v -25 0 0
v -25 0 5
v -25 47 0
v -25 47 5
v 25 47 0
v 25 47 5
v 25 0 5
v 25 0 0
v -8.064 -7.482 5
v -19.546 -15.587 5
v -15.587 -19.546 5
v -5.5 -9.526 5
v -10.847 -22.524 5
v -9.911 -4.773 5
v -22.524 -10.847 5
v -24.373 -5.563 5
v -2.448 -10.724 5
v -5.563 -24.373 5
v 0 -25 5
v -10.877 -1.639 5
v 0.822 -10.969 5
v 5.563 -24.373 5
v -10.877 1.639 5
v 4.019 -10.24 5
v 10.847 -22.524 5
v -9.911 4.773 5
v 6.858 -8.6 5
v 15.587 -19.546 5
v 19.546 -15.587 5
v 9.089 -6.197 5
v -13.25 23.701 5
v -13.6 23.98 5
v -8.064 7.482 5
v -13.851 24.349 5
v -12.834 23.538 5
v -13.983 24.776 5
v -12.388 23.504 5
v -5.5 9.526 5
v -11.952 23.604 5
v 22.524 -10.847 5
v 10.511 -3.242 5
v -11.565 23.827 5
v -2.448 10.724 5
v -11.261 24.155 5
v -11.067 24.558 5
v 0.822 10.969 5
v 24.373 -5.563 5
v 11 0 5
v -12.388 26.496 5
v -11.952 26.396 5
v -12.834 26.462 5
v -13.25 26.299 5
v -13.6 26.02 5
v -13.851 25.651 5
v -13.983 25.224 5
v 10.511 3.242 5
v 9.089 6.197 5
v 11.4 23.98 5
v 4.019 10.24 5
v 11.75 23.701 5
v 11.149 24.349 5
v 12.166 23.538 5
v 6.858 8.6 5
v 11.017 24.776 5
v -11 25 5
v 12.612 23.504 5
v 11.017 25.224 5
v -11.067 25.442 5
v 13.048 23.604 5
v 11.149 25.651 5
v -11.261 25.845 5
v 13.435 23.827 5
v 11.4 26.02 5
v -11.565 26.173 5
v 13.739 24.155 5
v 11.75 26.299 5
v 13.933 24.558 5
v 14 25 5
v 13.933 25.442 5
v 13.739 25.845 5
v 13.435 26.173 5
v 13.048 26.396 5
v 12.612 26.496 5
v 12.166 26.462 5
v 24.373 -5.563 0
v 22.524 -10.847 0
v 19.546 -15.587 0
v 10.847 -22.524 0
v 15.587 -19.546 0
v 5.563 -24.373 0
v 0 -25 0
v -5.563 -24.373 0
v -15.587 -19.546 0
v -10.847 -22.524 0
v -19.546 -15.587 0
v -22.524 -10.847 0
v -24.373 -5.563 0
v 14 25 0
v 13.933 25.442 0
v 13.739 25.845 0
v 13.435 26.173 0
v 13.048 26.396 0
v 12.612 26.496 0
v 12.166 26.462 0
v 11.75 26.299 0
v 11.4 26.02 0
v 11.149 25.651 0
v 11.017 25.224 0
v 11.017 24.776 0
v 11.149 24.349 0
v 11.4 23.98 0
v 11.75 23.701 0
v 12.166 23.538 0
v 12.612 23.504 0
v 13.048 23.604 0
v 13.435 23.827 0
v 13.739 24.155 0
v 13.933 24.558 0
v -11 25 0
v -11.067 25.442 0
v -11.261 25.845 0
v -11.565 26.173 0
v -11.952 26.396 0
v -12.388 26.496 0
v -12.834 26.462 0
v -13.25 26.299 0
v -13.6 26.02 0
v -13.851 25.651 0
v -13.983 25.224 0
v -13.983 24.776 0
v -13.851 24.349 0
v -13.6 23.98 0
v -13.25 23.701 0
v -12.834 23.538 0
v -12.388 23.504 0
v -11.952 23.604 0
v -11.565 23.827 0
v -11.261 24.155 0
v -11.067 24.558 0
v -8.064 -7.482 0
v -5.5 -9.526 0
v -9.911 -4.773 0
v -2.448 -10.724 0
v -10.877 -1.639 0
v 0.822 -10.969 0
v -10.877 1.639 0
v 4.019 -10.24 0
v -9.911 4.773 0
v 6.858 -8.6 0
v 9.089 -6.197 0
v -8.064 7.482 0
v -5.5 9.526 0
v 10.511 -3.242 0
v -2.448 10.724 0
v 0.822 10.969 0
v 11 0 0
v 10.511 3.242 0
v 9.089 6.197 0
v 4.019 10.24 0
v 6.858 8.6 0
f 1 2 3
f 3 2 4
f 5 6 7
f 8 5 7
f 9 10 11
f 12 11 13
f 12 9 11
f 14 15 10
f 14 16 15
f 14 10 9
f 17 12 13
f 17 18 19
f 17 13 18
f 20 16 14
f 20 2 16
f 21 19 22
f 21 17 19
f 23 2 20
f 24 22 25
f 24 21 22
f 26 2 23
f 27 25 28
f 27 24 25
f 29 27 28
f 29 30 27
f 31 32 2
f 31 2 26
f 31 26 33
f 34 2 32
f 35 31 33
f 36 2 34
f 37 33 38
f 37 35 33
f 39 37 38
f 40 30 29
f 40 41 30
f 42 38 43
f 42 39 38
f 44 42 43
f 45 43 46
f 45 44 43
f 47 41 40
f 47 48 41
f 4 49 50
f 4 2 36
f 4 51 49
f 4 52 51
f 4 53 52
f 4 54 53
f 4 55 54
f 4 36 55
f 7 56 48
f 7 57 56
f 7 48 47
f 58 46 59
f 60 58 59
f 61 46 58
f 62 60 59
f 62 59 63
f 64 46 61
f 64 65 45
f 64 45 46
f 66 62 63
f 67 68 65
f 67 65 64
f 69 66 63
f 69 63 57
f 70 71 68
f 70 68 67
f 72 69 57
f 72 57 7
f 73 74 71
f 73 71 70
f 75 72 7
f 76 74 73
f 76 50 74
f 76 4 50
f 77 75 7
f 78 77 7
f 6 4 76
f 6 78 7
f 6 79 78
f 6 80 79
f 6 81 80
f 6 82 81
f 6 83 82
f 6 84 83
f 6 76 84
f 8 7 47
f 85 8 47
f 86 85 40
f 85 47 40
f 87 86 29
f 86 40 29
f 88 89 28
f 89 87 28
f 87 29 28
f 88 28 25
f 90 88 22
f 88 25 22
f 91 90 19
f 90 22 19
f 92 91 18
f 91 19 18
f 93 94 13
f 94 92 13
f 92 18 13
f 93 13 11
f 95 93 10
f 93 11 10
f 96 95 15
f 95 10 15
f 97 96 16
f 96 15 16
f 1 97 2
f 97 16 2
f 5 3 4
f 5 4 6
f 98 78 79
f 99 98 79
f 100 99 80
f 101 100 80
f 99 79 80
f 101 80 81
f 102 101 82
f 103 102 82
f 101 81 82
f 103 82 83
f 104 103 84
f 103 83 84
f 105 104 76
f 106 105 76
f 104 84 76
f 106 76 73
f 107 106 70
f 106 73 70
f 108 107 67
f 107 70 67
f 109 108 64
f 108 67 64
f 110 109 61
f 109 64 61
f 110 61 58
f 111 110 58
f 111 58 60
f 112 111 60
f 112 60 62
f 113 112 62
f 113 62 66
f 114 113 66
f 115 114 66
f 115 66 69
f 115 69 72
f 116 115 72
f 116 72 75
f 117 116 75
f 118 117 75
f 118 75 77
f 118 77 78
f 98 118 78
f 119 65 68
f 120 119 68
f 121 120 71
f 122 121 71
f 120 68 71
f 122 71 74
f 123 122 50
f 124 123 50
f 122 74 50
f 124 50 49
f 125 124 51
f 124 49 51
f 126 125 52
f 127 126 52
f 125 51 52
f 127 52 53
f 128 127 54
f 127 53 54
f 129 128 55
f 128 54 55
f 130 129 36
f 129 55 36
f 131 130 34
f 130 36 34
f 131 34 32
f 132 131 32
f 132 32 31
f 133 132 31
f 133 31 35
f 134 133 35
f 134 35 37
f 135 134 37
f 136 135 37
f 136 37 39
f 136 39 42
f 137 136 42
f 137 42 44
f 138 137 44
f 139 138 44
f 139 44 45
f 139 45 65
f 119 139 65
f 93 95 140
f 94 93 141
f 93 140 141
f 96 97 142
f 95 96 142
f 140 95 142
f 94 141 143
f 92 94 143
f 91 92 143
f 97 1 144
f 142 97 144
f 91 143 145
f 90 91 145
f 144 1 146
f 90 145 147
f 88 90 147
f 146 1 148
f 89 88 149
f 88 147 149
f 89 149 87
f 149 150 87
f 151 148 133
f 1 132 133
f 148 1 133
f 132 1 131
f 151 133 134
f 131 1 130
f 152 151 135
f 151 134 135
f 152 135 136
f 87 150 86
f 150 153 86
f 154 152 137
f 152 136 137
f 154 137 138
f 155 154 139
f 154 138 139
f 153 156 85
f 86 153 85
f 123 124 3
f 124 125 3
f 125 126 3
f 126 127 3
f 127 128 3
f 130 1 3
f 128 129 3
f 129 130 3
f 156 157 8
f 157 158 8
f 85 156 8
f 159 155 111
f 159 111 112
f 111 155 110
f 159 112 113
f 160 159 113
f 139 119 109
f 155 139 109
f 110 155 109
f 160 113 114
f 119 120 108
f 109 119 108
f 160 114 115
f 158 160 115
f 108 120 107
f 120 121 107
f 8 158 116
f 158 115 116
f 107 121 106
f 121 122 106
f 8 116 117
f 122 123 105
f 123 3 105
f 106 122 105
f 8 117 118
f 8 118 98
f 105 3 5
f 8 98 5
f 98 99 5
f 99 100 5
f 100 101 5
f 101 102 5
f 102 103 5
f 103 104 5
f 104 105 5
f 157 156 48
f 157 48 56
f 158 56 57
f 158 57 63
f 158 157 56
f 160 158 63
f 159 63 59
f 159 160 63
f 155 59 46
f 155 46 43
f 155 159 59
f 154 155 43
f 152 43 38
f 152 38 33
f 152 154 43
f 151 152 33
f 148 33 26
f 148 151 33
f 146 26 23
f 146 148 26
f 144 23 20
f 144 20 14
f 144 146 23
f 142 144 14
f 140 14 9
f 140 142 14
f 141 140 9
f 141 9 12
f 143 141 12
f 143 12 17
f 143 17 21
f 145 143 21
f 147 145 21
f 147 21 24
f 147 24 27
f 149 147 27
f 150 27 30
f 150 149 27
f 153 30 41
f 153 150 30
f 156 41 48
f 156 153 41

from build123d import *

# Parameters (mm, degrees)
ESQUISSE1_W             = 94
ESQUISSE1_H             = 93.807810261
ESQUISSE1_R             = 11
BOSS_EXTRU_1_DEPTH      = 5
ESQUISSE2_R             = 1.5
ENL_V_MAT_EXTRU_1_DEPTH = 67.655832453


with BuildPart() as part:
    # Esquisse1 → Boss.-Extru.1 (new body)
    with BuildSketch(Plane.XY):
        with Locations((0, 0.096094869)):
            Rectangle(ESQUISSE1_W, ESQUISSE1_H)
        Circle(ESQUISSE1_R, mode=Mode.SUBTRACT)
    extrude(amount=BOSS_EXTRU_1_DEPTH)

    # Esquisse2 → Enlèv. mat.-Extru.1 (cut, through all)
    with BuildSketch(Plane.XY.offset(5)):
        with BuildLine():
            Line((25, 47), (25, 0))
            ThreePointArc((25, 0), (0, -25), (-25, 0))
            Line((-25, 0), (-25, 47))
            Line((-25, 47), (-47, 47))
            Line((-47, 47), (-47, -46.807810261))
            Line((-47, -46.807810261), (47, -46.807810261))
            Line((47, -46.807810261), (47, 47))
            Line((47, 47), (25, 47))
        make_face()
        with Locations((-12.5, 25)):
            Circle(ESQUISSE2_R)
        with Locations((12.5, 25)):
            Circle(ESQUISSE2_R)
    extrude(amount=-ENL_V_MAT_EXTRU_1_DEPTH, mode=Mode.SUBTRACT)


solid = part.part
